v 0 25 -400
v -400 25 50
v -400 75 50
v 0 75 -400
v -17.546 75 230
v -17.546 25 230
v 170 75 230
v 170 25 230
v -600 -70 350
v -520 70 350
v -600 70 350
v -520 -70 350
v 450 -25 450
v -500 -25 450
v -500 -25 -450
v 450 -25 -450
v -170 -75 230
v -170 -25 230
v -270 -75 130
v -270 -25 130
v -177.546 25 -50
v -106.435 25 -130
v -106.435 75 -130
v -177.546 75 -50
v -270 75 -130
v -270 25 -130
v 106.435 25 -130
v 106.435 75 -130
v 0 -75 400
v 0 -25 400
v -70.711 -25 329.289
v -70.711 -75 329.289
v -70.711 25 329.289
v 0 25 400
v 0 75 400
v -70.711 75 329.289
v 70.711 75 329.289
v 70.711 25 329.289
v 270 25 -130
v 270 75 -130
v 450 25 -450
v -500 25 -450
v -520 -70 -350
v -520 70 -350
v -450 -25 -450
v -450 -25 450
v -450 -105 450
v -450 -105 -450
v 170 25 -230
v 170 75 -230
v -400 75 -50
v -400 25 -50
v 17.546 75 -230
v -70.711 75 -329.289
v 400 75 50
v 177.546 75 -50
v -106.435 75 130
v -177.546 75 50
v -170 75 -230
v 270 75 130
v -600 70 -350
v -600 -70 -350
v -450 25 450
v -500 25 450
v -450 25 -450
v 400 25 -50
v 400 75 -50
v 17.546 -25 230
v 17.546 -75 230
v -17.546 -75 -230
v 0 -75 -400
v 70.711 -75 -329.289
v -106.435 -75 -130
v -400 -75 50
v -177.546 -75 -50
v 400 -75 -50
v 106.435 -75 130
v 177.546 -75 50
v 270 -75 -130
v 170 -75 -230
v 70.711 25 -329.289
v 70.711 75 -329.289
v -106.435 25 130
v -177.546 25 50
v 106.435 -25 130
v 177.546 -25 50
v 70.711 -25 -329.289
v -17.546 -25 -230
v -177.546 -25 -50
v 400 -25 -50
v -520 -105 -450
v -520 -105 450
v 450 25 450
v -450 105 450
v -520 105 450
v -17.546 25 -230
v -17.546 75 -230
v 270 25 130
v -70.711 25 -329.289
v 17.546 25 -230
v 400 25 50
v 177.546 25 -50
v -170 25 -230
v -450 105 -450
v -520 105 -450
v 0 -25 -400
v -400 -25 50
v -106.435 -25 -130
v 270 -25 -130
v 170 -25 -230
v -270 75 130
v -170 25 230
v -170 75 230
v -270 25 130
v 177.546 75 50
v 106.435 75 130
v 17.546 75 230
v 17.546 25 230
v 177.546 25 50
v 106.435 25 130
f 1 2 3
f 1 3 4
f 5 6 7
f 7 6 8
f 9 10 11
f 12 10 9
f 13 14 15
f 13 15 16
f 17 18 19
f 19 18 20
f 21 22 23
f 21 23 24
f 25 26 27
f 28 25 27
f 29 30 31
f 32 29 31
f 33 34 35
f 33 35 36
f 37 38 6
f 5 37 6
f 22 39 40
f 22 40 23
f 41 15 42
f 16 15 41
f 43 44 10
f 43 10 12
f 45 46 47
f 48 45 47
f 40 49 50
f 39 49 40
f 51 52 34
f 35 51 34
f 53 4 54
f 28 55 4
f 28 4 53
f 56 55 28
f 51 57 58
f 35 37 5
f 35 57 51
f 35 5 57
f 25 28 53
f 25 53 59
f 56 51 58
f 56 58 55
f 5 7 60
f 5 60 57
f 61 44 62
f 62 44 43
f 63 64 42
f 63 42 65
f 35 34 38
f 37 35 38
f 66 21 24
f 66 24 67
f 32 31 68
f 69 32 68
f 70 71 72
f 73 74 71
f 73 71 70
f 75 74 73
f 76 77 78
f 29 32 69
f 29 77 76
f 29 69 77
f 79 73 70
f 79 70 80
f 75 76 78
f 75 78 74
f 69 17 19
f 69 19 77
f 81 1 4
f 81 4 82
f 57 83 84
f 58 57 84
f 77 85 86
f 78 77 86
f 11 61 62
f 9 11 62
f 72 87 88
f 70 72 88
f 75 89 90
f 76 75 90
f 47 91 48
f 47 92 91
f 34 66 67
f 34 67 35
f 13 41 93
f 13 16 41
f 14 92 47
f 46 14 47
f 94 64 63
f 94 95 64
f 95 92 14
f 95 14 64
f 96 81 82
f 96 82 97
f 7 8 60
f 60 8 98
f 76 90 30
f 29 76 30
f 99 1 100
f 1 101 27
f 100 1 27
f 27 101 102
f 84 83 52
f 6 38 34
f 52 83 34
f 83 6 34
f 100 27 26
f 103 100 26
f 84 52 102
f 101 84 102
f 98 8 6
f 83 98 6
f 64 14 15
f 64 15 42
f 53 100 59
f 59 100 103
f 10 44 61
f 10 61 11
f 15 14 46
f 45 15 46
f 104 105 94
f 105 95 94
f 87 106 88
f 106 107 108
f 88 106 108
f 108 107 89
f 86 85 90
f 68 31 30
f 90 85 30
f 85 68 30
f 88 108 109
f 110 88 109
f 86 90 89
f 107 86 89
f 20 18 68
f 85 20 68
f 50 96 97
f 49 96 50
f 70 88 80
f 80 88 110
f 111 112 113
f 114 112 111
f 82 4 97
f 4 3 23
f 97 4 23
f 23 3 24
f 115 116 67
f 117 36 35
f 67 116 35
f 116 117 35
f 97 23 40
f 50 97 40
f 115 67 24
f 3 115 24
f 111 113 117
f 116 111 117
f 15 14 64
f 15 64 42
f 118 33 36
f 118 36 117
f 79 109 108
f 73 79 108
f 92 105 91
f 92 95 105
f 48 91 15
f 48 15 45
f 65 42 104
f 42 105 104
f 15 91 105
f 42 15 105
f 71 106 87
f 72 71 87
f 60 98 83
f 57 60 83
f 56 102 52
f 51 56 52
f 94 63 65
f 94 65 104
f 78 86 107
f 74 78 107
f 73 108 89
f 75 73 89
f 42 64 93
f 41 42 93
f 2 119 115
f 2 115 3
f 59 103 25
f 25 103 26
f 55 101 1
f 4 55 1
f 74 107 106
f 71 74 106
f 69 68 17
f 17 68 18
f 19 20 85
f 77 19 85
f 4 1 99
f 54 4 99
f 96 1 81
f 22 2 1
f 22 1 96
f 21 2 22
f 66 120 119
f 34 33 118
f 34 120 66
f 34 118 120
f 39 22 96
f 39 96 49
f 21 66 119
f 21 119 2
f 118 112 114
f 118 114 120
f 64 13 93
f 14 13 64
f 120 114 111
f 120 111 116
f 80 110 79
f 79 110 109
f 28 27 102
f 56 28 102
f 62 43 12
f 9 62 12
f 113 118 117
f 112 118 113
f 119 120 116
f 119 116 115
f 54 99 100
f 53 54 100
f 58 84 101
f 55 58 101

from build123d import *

# Parameters (mm, degrees)
F1_DEPTH  = 25
F2_W      = 70
F2_H      = 800
F3_DEPTH  = 80
F5_W      = 20
F5_H      = 50
F6_DEPTH  = 800
F8_DEPTH  = 50
F11_W     = 140
F11_H     = 700
F12_DEPTH = 80
F13_DEPTH = 50
F14_DEPTH = 50


with BuildPart() as f1:
    # F0 (on Front) → F1 (new body, symmetric)
    with BuildSketch(Plane.XZ):
        Polygon((450, 450), (-450, 450), (-500, 450), (-500, -450), (-450, -450), (450, -450), align=None)
    extrude(amount=F1_DEPTH, both=True)


with BuildPart() as f3:
    # F2 (on face) → F3 (new body)
    with BuildSketch(Plane.XZ.offset(25)):
        with Locations((-485, 0)):
            Rectangle(F2_W, F2_H)
    extrude(amount=F3_DEPTH)


with BuildPart() as f4_1:
    # F4: instance of F3
    add(f3.part.mirror(Plane.XZ))


with BuildPart() as f3_1:
    add(f3.part)

    add(f4_1.part)  # F6 merges F4_1
    # F5 (on face) → F6 (join, through all)
    with BuildSketch(Plane.XY.offset(400)):
        with Locations((-510, 0)):
            Rectangle(F5_W, F5_H)
    extrude(amount=-F6_DEPTH)

    # F13 (add, through all): a face of the model
    f13_faces = [f3_1.faces().sort_by_distance(p)[0] for p in [
        (-452.2135943621, 65, 400),
    ]]
    extrude(f13_faces, amount=F13_DEPTH)

    # F14 (add, through all): a face of the model
    f14_faces = [f3_1.faces().sort_by_distance(p)[0] for p in [
        (-517.7864056379, 0, -400),
    ]]
    extrude(f14_faces, amount=F14_DEPTH)


with BuildPart() as f8:
    # F7 (on face) → F8 (new body)
    with BuildSketch(Plane.XZ.offset(25)):
        Polygon((-400, 50), (0, -400), (70.7106781187, -329.2893218813), (-17.546496887, -230), (170, -230), (270, -130), (-106.4353857759, -130), (-177.546496887, -50), (400, -50), (0, 400), (-70.7106781187, 329.2893218813), (17.546496887, 230), (-170, 230), (-270, 130), (106.4353857759, 130), (177.546496887, 50), align=None)
    extrude(amount=F8_DEPTH)


with BuildPart() as f9_1:
    # F9: instance of F8
    add(f8.part.mirror(Plane.XZ))


with BuildPart() as f10_1:
    # F10: instance of F9_1
    add(f9_1.part.mirror(Plane.YZ))


with BuildPart() as f12:
    # F11 (on face) → F12 (new body)
    with BuildSketch(Plane(origin=(-520, 0, 0), x_dir=(0, -1, 0), z_dir=(-1, 0, 0))):
        Rectangle(F11_W, F11_H)
    extrude(amount=F12_DEPTH)


solid = Compound([f1.part, f3_1.part, f8.part, f9_1.part, f10_1.part, f12.part])
